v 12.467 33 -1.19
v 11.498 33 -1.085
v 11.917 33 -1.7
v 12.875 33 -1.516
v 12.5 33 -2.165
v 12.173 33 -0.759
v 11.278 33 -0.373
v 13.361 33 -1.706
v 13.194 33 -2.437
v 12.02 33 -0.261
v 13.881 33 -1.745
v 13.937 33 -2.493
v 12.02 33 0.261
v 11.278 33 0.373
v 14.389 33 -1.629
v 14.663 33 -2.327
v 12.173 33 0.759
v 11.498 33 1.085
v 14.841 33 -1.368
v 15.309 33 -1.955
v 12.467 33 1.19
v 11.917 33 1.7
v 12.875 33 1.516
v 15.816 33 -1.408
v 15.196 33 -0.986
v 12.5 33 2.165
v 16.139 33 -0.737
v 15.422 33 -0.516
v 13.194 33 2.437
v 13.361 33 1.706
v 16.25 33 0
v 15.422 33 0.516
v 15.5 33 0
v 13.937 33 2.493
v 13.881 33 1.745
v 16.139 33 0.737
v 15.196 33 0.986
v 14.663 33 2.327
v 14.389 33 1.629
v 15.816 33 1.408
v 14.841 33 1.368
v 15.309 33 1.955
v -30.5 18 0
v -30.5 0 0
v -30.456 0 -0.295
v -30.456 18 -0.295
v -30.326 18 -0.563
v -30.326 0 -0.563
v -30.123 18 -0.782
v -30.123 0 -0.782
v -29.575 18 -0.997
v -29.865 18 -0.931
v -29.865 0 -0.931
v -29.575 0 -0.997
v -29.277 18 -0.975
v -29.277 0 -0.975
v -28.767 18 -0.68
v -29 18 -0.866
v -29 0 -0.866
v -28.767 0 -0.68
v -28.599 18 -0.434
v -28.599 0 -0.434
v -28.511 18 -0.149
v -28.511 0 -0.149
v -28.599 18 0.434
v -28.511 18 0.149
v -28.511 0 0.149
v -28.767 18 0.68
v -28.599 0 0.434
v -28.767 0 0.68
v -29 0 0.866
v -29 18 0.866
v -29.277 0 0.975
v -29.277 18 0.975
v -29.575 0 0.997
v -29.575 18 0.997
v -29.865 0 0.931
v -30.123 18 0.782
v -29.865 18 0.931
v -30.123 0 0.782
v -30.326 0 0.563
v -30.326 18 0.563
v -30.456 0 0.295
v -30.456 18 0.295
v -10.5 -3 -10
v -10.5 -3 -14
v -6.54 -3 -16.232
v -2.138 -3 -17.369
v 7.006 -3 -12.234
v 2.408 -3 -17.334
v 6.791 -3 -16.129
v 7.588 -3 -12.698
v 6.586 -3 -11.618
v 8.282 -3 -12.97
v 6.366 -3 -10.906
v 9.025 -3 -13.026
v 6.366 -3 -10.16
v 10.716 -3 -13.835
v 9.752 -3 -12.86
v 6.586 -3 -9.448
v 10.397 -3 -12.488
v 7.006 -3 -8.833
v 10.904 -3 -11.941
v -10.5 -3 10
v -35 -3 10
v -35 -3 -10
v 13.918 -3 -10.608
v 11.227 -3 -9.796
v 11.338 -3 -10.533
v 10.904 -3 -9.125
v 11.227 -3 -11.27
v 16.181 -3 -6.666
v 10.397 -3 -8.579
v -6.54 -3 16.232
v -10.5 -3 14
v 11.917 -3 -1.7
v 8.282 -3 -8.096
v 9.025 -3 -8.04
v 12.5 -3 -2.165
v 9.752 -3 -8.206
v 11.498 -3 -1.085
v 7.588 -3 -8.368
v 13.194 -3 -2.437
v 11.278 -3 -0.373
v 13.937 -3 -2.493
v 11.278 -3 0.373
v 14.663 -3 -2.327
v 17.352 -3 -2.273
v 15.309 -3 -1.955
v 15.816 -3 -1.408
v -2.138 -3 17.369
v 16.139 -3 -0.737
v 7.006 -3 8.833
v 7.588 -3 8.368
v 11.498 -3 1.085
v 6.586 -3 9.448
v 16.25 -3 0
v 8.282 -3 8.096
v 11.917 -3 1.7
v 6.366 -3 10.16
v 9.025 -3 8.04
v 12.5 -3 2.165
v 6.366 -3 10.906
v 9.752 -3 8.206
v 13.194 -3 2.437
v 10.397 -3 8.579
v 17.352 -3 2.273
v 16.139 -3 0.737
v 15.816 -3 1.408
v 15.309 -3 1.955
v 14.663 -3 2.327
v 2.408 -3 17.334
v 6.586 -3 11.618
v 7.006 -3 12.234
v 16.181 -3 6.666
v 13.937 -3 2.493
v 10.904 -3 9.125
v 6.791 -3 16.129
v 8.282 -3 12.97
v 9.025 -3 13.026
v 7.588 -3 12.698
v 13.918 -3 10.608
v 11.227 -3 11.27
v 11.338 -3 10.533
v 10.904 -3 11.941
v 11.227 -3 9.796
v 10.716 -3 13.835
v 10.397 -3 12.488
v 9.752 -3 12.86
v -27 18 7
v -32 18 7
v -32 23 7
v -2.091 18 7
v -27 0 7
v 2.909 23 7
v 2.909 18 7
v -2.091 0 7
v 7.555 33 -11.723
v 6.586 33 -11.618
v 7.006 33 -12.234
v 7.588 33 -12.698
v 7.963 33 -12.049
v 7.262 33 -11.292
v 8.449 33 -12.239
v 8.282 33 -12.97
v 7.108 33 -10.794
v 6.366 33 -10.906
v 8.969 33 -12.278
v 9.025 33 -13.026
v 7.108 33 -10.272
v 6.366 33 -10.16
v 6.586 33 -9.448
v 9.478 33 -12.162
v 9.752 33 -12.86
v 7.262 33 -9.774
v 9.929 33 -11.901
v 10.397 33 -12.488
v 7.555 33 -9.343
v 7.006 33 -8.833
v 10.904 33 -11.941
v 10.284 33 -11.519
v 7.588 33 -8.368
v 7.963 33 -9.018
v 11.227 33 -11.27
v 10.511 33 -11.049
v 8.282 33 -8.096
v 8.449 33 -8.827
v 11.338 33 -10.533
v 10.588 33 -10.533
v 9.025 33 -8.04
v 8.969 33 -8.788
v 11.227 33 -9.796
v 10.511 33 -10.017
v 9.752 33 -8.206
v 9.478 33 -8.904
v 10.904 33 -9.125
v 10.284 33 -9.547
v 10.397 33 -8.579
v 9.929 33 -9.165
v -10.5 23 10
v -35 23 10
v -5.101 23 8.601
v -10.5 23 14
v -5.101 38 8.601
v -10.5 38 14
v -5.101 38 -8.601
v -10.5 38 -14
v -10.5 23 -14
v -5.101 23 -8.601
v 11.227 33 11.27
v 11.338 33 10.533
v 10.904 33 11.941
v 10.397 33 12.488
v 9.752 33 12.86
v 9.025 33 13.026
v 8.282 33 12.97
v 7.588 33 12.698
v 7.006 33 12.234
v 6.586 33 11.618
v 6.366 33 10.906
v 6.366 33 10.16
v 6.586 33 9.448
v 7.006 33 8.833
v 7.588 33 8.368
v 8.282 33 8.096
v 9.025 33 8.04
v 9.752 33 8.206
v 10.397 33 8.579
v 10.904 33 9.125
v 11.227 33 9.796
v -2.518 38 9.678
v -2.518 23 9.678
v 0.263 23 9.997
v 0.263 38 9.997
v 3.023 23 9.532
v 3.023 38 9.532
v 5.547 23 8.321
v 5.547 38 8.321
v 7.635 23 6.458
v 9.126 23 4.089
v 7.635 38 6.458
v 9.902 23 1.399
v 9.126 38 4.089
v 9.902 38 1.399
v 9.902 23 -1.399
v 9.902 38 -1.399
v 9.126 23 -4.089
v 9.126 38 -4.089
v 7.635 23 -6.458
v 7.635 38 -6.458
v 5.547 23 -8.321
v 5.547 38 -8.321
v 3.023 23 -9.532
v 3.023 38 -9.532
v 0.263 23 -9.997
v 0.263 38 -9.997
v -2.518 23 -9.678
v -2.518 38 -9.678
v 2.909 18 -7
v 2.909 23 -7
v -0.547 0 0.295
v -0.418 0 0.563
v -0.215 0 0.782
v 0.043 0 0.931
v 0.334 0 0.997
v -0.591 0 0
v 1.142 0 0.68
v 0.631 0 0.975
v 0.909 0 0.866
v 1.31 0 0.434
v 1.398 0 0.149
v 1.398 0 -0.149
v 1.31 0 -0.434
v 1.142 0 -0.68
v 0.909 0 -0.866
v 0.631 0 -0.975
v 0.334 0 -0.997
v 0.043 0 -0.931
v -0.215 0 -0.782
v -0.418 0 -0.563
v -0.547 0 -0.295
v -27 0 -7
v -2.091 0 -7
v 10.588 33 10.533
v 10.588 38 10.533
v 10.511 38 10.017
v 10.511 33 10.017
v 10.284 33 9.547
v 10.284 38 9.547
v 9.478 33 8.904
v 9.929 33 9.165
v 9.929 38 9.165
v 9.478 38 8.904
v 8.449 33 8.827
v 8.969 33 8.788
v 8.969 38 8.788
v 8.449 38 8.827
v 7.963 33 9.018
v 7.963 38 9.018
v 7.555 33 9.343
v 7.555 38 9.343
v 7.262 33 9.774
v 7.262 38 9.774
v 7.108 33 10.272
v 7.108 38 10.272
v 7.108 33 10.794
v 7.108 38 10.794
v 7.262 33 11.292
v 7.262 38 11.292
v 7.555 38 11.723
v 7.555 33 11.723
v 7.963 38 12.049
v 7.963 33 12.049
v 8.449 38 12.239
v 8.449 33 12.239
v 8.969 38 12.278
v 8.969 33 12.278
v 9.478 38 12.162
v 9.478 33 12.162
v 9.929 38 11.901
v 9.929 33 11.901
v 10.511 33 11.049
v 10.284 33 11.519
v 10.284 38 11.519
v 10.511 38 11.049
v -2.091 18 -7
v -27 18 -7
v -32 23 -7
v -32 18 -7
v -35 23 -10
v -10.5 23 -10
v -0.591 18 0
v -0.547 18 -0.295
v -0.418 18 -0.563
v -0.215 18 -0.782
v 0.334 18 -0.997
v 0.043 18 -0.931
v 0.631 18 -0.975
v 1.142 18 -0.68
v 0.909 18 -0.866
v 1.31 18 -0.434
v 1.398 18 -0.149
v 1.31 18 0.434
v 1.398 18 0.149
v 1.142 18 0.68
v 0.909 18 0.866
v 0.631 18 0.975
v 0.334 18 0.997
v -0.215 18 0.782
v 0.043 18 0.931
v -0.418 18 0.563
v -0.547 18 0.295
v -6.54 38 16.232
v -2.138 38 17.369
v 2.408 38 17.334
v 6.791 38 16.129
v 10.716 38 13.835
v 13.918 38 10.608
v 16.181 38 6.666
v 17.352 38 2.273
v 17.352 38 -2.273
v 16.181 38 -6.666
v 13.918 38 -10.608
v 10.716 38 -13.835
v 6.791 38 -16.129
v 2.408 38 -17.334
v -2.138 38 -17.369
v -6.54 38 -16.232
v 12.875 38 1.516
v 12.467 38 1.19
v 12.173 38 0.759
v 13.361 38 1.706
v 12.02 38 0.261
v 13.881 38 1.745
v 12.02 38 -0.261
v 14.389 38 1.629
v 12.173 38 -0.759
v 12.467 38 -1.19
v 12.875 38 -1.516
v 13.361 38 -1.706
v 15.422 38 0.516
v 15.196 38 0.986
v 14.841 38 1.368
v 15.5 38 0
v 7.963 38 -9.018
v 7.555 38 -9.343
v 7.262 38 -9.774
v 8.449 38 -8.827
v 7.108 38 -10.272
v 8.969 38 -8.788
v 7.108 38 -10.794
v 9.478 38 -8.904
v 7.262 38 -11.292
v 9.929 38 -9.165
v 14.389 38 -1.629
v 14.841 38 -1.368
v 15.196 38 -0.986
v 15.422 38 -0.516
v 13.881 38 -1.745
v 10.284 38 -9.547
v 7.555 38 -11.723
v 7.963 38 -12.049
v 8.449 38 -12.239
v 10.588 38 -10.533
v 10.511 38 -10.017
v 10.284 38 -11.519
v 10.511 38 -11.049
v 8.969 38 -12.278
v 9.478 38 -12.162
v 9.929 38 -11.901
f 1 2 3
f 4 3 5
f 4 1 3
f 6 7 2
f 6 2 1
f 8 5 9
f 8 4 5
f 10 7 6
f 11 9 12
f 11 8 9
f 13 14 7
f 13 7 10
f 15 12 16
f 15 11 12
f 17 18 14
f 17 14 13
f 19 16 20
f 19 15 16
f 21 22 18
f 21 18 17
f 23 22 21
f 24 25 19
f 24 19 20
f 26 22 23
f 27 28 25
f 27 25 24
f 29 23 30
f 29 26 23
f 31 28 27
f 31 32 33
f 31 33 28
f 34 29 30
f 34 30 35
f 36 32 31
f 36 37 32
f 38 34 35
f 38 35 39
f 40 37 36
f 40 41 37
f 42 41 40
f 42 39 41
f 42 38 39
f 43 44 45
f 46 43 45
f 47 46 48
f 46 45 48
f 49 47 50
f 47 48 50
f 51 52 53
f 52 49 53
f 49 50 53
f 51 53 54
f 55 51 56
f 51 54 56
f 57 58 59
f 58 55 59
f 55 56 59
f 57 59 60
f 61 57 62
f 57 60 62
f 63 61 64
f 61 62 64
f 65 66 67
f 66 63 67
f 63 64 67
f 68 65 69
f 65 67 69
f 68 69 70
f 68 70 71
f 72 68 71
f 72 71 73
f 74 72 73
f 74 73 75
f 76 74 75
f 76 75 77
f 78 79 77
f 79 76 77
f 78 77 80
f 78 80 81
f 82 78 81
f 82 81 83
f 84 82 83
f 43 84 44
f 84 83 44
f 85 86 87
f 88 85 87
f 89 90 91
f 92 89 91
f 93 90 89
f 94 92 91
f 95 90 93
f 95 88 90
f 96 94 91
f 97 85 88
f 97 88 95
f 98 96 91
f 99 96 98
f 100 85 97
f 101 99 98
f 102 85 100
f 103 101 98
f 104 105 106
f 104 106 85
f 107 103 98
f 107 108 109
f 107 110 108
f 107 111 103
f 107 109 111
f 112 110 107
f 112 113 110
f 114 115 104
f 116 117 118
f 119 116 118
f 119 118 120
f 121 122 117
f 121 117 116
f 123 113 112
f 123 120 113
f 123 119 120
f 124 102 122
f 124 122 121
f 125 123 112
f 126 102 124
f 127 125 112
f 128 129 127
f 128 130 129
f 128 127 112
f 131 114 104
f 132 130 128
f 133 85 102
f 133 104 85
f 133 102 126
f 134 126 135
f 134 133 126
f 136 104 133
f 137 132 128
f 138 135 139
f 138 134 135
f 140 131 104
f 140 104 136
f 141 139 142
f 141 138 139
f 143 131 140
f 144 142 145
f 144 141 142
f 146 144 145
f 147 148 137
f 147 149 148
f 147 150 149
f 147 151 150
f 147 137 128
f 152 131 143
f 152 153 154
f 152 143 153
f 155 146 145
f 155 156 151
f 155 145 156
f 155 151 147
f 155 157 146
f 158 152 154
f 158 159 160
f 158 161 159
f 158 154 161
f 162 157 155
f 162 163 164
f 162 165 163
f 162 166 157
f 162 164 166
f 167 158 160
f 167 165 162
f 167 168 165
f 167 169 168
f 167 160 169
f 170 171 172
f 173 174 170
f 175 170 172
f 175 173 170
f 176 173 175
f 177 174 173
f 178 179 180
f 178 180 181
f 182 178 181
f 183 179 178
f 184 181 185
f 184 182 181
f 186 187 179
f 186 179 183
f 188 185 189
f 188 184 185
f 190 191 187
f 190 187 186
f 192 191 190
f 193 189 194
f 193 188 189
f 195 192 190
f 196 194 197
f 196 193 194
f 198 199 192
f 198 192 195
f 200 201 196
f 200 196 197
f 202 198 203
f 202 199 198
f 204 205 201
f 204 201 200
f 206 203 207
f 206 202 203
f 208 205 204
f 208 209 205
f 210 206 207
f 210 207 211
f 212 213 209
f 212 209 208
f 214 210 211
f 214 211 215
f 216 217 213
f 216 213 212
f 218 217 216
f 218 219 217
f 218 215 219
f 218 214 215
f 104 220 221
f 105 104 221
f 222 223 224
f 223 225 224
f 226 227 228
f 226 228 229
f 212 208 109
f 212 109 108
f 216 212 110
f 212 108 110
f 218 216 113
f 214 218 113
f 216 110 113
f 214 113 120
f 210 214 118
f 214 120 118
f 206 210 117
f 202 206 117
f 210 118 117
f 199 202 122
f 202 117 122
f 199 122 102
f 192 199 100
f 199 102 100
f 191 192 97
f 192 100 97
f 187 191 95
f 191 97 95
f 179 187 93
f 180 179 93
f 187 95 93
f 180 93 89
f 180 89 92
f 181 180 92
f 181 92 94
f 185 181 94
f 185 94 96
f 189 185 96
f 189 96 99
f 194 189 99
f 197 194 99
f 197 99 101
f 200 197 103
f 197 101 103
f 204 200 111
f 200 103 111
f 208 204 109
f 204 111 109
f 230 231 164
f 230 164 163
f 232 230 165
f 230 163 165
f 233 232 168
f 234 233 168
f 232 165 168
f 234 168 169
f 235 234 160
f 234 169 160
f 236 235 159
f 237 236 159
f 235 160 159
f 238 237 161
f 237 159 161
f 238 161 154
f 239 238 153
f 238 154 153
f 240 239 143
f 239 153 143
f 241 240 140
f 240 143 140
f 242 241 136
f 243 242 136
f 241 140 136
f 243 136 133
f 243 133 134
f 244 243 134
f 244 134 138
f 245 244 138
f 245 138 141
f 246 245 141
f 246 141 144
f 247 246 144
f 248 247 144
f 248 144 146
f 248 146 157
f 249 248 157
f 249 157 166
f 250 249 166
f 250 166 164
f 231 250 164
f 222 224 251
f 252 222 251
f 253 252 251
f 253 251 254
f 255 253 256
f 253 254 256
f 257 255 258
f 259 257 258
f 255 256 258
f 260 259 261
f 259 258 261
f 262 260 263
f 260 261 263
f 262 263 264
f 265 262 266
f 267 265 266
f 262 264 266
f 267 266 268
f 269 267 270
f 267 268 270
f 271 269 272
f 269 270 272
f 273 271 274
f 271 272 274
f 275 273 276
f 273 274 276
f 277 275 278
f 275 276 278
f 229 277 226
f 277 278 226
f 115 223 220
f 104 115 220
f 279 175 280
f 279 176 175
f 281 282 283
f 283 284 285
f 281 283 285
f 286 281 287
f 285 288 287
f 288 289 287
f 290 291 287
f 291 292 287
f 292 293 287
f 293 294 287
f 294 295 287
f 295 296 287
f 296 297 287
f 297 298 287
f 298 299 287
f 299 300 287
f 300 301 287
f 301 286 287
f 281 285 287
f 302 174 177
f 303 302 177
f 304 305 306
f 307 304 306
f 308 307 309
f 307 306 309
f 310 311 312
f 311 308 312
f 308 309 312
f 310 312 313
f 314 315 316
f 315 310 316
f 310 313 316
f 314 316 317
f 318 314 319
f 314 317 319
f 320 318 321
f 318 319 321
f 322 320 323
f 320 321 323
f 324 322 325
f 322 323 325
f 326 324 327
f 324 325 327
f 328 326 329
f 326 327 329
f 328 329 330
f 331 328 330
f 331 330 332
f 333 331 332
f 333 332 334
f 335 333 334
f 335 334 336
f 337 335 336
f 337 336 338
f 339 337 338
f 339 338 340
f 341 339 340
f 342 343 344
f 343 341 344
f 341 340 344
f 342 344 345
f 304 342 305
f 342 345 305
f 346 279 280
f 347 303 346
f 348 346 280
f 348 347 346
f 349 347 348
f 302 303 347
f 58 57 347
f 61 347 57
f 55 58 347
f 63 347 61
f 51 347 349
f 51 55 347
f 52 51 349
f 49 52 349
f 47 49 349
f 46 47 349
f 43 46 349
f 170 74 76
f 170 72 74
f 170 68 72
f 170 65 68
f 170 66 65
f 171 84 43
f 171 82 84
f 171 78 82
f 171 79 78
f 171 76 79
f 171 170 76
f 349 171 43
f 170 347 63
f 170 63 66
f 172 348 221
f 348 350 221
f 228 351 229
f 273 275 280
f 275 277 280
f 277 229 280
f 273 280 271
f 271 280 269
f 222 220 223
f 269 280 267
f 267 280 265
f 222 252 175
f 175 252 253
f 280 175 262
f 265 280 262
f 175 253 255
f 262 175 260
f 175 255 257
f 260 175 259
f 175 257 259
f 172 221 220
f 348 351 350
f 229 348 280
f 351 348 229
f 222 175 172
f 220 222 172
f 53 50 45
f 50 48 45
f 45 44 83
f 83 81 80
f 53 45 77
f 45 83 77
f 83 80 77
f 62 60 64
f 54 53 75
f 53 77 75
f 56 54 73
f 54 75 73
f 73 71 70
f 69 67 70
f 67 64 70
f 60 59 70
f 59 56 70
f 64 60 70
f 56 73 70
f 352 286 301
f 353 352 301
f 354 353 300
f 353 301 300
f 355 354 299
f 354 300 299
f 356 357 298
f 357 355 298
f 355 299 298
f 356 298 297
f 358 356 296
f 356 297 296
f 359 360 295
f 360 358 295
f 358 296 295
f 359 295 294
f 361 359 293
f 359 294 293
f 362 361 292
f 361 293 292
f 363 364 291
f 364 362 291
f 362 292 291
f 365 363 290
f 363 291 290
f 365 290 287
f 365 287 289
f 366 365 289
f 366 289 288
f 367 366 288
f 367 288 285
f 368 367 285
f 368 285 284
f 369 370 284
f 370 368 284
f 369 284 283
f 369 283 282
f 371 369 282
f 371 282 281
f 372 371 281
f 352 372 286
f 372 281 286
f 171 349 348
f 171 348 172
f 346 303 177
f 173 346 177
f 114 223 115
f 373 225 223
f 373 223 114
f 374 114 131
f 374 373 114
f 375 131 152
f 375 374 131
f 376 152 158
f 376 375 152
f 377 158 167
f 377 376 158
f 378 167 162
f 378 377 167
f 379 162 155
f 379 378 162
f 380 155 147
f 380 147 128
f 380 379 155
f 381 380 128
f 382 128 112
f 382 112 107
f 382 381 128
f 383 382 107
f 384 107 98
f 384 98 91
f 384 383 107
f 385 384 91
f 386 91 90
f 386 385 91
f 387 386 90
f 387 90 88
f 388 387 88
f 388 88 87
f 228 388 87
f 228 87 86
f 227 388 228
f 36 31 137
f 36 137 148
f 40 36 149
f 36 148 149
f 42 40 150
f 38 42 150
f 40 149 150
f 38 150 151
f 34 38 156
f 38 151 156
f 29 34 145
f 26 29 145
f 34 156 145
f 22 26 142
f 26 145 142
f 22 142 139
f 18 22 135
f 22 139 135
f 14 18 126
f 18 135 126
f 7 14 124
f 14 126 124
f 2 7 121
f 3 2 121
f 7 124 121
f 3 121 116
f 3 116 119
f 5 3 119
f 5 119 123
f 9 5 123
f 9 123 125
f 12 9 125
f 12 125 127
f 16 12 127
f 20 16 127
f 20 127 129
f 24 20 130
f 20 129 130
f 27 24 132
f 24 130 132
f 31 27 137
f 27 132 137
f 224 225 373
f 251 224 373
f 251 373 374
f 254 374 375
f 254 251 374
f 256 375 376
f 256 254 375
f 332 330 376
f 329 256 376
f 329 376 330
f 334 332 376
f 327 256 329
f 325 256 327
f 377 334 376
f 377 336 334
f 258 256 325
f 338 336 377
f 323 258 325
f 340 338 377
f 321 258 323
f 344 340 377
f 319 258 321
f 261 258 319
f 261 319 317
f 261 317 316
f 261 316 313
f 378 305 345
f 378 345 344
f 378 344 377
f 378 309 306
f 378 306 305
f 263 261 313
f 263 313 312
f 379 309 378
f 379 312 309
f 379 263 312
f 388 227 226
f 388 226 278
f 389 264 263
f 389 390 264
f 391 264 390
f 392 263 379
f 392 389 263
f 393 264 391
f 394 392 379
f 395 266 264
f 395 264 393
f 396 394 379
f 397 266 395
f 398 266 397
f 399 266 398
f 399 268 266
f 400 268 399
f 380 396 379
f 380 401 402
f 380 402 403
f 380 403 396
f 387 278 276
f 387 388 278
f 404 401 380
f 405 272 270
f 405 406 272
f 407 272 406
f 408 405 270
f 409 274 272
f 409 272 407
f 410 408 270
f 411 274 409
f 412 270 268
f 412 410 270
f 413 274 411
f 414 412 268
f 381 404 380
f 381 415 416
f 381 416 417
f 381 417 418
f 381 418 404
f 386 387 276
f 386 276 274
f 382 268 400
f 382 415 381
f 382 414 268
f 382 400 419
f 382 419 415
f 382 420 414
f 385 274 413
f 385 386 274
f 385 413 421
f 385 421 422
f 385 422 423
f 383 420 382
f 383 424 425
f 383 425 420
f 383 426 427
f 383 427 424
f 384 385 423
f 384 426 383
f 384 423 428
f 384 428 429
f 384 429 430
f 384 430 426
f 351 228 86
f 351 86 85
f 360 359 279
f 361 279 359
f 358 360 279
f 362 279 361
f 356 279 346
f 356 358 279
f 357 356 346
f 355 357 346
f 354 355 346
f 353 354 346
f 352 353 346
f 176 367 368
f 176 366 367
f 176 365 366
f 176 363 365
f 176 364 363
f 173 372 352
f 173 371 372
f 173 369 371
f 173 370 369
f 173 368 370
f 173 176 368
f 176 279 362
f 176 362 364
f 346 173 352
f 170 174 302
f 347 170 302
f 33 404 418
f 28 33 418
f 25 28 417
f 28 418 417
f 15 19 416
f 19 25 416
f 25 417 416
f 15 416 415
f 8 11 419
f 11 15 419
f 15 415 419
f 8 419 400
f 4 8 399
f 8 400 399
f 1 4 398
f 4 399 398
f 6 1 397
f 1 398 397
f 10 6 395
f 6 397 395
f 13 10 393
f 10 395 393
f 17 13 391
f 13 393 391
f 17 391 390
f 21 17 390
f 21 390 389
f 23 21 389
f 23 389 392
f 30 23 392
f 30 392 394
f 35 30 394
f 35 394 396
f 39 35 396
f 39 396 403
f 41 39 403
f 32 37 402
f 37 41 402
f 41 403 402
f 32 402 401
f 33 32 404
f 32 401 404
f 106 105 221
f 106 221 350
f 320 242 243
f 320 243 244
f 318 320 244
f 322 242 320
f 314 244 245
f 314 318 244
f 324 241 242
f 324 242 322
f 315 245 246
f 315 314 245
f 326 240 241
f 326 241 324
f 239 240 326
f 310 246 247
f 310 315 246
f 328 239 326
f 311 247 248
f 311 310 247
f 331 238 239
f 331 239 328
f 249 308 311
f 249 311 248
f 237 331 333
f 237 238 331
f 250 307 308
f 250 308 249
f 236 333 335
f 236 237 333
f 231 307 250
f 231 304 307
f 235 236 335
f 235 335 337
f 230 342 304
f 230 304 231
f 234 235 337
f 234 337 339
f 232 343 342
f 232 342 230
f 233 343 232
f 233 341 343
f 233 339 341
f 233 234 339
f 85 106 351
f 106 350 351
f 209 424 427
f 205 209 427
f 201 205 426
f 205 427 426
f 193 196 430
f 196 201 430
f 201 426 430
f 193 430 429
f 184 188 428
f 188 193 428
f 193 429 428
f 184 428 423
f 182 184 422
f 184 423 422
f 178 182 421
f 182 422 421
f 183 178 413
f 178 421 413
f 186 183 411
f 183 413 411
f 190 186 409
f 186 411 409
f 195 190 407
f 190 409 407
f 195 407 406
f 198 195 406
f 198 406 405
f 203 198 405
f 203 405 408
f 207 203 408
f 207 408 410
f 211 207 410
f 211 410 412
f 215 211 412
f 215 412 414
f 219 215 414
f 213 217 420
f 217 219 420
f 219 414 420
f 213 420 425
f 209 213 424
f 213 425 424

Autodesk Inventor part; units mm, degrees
ref_plane "YZ Plane" through (0, 0, 0) normal (1, 0, 0) x (0, 1, 0)
ref_plane "XZ Plane" through (0, 0, 0) normal (0, 1, 0) x (-1, 0, 0)
ref_plane "XY Plane" through (0, 0, 0) normal (0, 0, 1) x (1, 0, 0)
sketch "Boceto1" plane through (0, 0, 0) normal (0, 1, 0) x (-1, 0, 0)
  line L0 (8.5, 0) -> (21, 0) construction
  line L1 (21, -7) -> (2.0913, -7)
  line L2 (21, -7) -> (27, -7)
  line L3 (21, 7) -> (27, 7)
  line L4 (27, 7) -> (27, -7)
  line L5 (27, -7) -> (32, -7)
  line L6 (32, -7) -> (32, 7)
  line L7 (32, 7) -> (27, 7)
  circle A0 centre (29.5, 0) radius 1
  line L8 (2.0913, -7) -> (2.0913, 7)
  line L9 (2.0913, -7) -> (16.0913, -7) construction
  line L10 (2.0913, 7) -> (21.0913, 7)
  line L11 (2.0913, -7) -> (-2.9087, -7)
  line L12 (2.0913, -7) -> (7.0913, -7) construction
  line L13 (-2.9087, -7) -> (-2.9087, 7)
  line L14 (-2.9087, 7) -> (2.0913, 7)
  circle A1 centre (-0.4087, 0) radius 1
  line L15 (2.0913, -7) -> (2.0913, 7)
  point P0 (0, 0)
  point P1 (0, 0)
  point P2 (0, 0)
  point P3 (0, 0)
  dimension "d3" = 6
  dimension "d5" = 5
  dimension "d6" = 14
  dimension "d7" = 2
  dimension "d8" = 14
  dimension "d9" = 90
  dimension "d10" = 19
  dimension "d11" = 5
  dimension "d12" = 180
  dimension "d13" = 14
  dimension "d14" = 2
extrude "Extrusión1" add sketch "Boceto1" along normal blind 18 contours L11 L13 L14 L8 | L4 L7 L6 L5
sketch "Boceto2" plane through (0, 0, 0) normal (0, -1, 0) x (1, 0, 0)
  line L0 (2.9087, 10) -> (-32, 10)
  line L1 (-32, 10) -> (-35, 10)
  line L2 (-35, 10) -> (-35, -7)
  line L3 (-35, -7) -> (-35, -10)
  line L4 (-35, -10) -> (2.9087, -10)
  line L5 (2.9087, -10) -> (5.9087, -10)
  line L6 (5.9087, -10) -> (5.9087, 10)
  line L7 (5.9087, 10) -> (2.9087, 10)
  line L8 (-2.0913, -7) -> (-27, -7)
  line L9 (-27, 7) -> (-2.0913, 7)
  line L10 (-2.0913, 7) -> (2.9087, 7)
  line L11 (2.9087, 7) -> (2.9087, -7) projected
  line L12 (2.9087, 7) -> (2.9087, -7)
  line L13 (2.9087, -7) -> (-2.0913, -7) projected
  line L14 (2.9087, -7) -> (-2.0913, -7)
  line L15 (-32, 7) -> (-27, 7) projected
  line L16 (-27, 7) -> (-32, 7)
  line L17 (-32, -7) -> (-32, 7) projected
  line L18 (-32, 7) -> (-32, -7)
  line L19 (-27, -7) -> (-32, -7) projected
  line L20 (-32, -7) -> (-27, -7)
  point P0 (0, 0)
  dimension "d21" = 3
  dimension "d22" = 3
  dimension "d23" = 3
extrude "Extrusión2" add sketch "Boceto2" against normal blind 23
sketch "Boceto3" plane through (0, 0, 0) normal (0, -1, 0) x (1, 0, 0)
  line L0 (5.9087, 10) -> (-35, 10) projected
  line L1 (5.9087, 10) -> (-35, 10)
  line L2 (-35, 10) -> (-35, -10) projected
  line L3 (-35, 10) -> (-35, -10)
  line L4 (-35, -10) -> (5.9087, -10)
  line L5 (5.9087, -10) -> (5.9087, 10) projected
  line L6 (5.9087, -10) -> (5.9087, 10)
  point P0 (0, 0)
extrude "Extrusión3" add sketch "Boceto3" along normal blind 3
sketch "Boceto4" plane through (0, 23, 0) normal (0, 1, 0) x (1, 0, 0)
  circle A0 centre (0.4087, 0) radius 1 projected
  point P0 (0, 0)
extrude "Extrusión4" add sketch "Boceto4" along normal blind 15
sketch "Boceto5" plane through (0.4087, 38, 0) normal (0, 1, 0) x (1, 0, 0)
  circle A0 centre (-0.4087, 0) radius 10
  circle A1 centre (-0.4087, 0) radius 17.5
  line L0 (-35.4087, 10) -> (5.5, 10) projected
  line L1 (-35.4087, 10) -> (-35.4087, -10) projected
  line L2 (-35.4087, 10) -> (-35.4087, 14)
  line L3 (-35.4087, 14) -> (-10.9087, 14)
  line L4 (-10.9087, 14) -> (-5.5098, 8.6011)
  line L5 (-10.9087, 14) -> (-3.2735, 14) construction
  line L6 (5.5, -10) -> (-35.4087, -10) projected
  line L7 (-35.4087, -10) -> (-35.4087, -14)
  line L8 (-35.4087, -14) -> (-10.9087, -14)
  line L9 (-10.9087, -14) -> (-5.5098, -8.6011)
  line L10 (-10.9087, -14) -> (-3.2735, -14) construction
  dimension "d32" = 20
  dimension "d33" = 35
  dimension "d35" = 4
  dimension "d36" = 45
  dimension "d37" = 4
  dimension "d38" = 45
extrude "Extrusión5" add sketch "Boceto5" against normal blind 15 contours L4 L0 A0 | A0 L6 L9 | L0 L4 A1 L9 L6 A0 picked at (-3.4554, 12.4332)
sketch "Boceto6" plane through (0.4087, 38, 0) normal (0, 1, 0) x (1, 0, 0)
  circle A0 centre (0, 0) radius 1 projected
  circle A1 centre (0, 0) radius 1
  point P0 (-0.4087, 0)
extrude "Extrusión6" cut sketch "Boceto6" against normal blind 15
sketch "Boceto7" plane through (0.4087, 23, 0) normal (0, -1, 0) x (1, 0, 0)
  circle A0 centre (-0.4087, 0) radius 17.5
  circle A1 centre (-0.4087, 0) radius 10
  line L0 (5.5, 8.0677) -> (5.5, -8.0677) projected
  arc A2 (-0.4087, -10) -> (5.5, -8.0677) centre (-0.4087, 0) ccw projected
  line L1 (5.5, 8.0677) -> (5.5, 10)
  line L2 (-35.4087, 10) -> (-6.9087, 10) projected
  line L3 (5.5, 10) -> (-6.9087, 10)
  line L4 (5.5, -8.0677) -> (5.5, -10) projected
  line L5 (5.5, -8.0677) -> (5.5, -10)
  line L6 (-0.4087, -10) -> (-6.9087, -10) projected
  line L7 (5.5, -10) -> (-6.9087, -10)
  arc A3 (-10.9087, -14) -> (-10.9087, 14) centre (-0.4087, 0) ccw projected
  line L8 (-10.9087, 14) -> (-10.9087, 10)
  line L9 (5.5, 10) -> (-35.4087, 10) projected
  line L10 (-10.9087, -14) -> (-10.9087, -10)
  line L11 (-10.9087, -10) -> (-6.9087, -10)
  line L12 (-6.9087, -10) -> (-35.4087, -10) projected
  dimension "d43" = 20
extrude "Extrusión7" add sketch "Boceto7" along normal blind 26 contours A0 L10 L11 L6 L7 L4 A1 L1 L3 L2 L8 | A1 L0 picked at (8.0064, 0)
sketch "Boceto8" plane through (0.4087, 38, 0) normal (0, 1, 0) x (1, 0, 0)
  line L0 (-0.4087, 0) -> (13.3413, 0)
  line L1 (-0.4087, 0) -> (8.4296, -10.5331)
  line L2 (-0.4087, 0) -> (13.3413, 0) construction
  line L3 (-0.4087, 0) -> (8.4296, 10.5331)
  line L4 (-0.4087, 0) -> (13.3413, 0) construction
  circle A0 centre (13.3413, 0) radius 1.75
  circle A1 centre (8.4296, -10.5331) radius 1.75
  circle A2 centre (8.4296, 10.5331) radius 1.75
  dimension "d46" = 13.75
  dimension "d47" = 13.75
  dimension "d48" = 50
  dimension "d49" = 13.75
  dimension "d50" = 50
  dimension "d51" = 3.5
  dimension "d52" = 3.5
  dimension "d53" = 3.5
extrude "Extrusión8" cut sketch "Boceto8" against normal blind 41
sketch "Boceto9" plane through (0, -3, 0) normal (0, -1, 0) x (1, 0, 0)
  circle A0 centre (8.8383, 10.5331) radius 1.75 projected
  circle A1 centre (8.8383, 10.5331) radius 2.5
  circle A2 centre (13.75, 0) radius 1.75 projected
  circle A3 centre (13.75, 0) radius 2.5
  circle A4 centre (8.8383, -10.5331) radius 1.75 projected
  circle A5 centre (8.8383, -10.5331) radius 2.5
  point P0 (0, 0)
  dimension "d56" = 5
  dimension "d57" = 5
  dimension "d58" = 5
extrude "Extrusión9" cut sketch "Boceto9" against normal blind 36
properties part number "enganche_servo"
